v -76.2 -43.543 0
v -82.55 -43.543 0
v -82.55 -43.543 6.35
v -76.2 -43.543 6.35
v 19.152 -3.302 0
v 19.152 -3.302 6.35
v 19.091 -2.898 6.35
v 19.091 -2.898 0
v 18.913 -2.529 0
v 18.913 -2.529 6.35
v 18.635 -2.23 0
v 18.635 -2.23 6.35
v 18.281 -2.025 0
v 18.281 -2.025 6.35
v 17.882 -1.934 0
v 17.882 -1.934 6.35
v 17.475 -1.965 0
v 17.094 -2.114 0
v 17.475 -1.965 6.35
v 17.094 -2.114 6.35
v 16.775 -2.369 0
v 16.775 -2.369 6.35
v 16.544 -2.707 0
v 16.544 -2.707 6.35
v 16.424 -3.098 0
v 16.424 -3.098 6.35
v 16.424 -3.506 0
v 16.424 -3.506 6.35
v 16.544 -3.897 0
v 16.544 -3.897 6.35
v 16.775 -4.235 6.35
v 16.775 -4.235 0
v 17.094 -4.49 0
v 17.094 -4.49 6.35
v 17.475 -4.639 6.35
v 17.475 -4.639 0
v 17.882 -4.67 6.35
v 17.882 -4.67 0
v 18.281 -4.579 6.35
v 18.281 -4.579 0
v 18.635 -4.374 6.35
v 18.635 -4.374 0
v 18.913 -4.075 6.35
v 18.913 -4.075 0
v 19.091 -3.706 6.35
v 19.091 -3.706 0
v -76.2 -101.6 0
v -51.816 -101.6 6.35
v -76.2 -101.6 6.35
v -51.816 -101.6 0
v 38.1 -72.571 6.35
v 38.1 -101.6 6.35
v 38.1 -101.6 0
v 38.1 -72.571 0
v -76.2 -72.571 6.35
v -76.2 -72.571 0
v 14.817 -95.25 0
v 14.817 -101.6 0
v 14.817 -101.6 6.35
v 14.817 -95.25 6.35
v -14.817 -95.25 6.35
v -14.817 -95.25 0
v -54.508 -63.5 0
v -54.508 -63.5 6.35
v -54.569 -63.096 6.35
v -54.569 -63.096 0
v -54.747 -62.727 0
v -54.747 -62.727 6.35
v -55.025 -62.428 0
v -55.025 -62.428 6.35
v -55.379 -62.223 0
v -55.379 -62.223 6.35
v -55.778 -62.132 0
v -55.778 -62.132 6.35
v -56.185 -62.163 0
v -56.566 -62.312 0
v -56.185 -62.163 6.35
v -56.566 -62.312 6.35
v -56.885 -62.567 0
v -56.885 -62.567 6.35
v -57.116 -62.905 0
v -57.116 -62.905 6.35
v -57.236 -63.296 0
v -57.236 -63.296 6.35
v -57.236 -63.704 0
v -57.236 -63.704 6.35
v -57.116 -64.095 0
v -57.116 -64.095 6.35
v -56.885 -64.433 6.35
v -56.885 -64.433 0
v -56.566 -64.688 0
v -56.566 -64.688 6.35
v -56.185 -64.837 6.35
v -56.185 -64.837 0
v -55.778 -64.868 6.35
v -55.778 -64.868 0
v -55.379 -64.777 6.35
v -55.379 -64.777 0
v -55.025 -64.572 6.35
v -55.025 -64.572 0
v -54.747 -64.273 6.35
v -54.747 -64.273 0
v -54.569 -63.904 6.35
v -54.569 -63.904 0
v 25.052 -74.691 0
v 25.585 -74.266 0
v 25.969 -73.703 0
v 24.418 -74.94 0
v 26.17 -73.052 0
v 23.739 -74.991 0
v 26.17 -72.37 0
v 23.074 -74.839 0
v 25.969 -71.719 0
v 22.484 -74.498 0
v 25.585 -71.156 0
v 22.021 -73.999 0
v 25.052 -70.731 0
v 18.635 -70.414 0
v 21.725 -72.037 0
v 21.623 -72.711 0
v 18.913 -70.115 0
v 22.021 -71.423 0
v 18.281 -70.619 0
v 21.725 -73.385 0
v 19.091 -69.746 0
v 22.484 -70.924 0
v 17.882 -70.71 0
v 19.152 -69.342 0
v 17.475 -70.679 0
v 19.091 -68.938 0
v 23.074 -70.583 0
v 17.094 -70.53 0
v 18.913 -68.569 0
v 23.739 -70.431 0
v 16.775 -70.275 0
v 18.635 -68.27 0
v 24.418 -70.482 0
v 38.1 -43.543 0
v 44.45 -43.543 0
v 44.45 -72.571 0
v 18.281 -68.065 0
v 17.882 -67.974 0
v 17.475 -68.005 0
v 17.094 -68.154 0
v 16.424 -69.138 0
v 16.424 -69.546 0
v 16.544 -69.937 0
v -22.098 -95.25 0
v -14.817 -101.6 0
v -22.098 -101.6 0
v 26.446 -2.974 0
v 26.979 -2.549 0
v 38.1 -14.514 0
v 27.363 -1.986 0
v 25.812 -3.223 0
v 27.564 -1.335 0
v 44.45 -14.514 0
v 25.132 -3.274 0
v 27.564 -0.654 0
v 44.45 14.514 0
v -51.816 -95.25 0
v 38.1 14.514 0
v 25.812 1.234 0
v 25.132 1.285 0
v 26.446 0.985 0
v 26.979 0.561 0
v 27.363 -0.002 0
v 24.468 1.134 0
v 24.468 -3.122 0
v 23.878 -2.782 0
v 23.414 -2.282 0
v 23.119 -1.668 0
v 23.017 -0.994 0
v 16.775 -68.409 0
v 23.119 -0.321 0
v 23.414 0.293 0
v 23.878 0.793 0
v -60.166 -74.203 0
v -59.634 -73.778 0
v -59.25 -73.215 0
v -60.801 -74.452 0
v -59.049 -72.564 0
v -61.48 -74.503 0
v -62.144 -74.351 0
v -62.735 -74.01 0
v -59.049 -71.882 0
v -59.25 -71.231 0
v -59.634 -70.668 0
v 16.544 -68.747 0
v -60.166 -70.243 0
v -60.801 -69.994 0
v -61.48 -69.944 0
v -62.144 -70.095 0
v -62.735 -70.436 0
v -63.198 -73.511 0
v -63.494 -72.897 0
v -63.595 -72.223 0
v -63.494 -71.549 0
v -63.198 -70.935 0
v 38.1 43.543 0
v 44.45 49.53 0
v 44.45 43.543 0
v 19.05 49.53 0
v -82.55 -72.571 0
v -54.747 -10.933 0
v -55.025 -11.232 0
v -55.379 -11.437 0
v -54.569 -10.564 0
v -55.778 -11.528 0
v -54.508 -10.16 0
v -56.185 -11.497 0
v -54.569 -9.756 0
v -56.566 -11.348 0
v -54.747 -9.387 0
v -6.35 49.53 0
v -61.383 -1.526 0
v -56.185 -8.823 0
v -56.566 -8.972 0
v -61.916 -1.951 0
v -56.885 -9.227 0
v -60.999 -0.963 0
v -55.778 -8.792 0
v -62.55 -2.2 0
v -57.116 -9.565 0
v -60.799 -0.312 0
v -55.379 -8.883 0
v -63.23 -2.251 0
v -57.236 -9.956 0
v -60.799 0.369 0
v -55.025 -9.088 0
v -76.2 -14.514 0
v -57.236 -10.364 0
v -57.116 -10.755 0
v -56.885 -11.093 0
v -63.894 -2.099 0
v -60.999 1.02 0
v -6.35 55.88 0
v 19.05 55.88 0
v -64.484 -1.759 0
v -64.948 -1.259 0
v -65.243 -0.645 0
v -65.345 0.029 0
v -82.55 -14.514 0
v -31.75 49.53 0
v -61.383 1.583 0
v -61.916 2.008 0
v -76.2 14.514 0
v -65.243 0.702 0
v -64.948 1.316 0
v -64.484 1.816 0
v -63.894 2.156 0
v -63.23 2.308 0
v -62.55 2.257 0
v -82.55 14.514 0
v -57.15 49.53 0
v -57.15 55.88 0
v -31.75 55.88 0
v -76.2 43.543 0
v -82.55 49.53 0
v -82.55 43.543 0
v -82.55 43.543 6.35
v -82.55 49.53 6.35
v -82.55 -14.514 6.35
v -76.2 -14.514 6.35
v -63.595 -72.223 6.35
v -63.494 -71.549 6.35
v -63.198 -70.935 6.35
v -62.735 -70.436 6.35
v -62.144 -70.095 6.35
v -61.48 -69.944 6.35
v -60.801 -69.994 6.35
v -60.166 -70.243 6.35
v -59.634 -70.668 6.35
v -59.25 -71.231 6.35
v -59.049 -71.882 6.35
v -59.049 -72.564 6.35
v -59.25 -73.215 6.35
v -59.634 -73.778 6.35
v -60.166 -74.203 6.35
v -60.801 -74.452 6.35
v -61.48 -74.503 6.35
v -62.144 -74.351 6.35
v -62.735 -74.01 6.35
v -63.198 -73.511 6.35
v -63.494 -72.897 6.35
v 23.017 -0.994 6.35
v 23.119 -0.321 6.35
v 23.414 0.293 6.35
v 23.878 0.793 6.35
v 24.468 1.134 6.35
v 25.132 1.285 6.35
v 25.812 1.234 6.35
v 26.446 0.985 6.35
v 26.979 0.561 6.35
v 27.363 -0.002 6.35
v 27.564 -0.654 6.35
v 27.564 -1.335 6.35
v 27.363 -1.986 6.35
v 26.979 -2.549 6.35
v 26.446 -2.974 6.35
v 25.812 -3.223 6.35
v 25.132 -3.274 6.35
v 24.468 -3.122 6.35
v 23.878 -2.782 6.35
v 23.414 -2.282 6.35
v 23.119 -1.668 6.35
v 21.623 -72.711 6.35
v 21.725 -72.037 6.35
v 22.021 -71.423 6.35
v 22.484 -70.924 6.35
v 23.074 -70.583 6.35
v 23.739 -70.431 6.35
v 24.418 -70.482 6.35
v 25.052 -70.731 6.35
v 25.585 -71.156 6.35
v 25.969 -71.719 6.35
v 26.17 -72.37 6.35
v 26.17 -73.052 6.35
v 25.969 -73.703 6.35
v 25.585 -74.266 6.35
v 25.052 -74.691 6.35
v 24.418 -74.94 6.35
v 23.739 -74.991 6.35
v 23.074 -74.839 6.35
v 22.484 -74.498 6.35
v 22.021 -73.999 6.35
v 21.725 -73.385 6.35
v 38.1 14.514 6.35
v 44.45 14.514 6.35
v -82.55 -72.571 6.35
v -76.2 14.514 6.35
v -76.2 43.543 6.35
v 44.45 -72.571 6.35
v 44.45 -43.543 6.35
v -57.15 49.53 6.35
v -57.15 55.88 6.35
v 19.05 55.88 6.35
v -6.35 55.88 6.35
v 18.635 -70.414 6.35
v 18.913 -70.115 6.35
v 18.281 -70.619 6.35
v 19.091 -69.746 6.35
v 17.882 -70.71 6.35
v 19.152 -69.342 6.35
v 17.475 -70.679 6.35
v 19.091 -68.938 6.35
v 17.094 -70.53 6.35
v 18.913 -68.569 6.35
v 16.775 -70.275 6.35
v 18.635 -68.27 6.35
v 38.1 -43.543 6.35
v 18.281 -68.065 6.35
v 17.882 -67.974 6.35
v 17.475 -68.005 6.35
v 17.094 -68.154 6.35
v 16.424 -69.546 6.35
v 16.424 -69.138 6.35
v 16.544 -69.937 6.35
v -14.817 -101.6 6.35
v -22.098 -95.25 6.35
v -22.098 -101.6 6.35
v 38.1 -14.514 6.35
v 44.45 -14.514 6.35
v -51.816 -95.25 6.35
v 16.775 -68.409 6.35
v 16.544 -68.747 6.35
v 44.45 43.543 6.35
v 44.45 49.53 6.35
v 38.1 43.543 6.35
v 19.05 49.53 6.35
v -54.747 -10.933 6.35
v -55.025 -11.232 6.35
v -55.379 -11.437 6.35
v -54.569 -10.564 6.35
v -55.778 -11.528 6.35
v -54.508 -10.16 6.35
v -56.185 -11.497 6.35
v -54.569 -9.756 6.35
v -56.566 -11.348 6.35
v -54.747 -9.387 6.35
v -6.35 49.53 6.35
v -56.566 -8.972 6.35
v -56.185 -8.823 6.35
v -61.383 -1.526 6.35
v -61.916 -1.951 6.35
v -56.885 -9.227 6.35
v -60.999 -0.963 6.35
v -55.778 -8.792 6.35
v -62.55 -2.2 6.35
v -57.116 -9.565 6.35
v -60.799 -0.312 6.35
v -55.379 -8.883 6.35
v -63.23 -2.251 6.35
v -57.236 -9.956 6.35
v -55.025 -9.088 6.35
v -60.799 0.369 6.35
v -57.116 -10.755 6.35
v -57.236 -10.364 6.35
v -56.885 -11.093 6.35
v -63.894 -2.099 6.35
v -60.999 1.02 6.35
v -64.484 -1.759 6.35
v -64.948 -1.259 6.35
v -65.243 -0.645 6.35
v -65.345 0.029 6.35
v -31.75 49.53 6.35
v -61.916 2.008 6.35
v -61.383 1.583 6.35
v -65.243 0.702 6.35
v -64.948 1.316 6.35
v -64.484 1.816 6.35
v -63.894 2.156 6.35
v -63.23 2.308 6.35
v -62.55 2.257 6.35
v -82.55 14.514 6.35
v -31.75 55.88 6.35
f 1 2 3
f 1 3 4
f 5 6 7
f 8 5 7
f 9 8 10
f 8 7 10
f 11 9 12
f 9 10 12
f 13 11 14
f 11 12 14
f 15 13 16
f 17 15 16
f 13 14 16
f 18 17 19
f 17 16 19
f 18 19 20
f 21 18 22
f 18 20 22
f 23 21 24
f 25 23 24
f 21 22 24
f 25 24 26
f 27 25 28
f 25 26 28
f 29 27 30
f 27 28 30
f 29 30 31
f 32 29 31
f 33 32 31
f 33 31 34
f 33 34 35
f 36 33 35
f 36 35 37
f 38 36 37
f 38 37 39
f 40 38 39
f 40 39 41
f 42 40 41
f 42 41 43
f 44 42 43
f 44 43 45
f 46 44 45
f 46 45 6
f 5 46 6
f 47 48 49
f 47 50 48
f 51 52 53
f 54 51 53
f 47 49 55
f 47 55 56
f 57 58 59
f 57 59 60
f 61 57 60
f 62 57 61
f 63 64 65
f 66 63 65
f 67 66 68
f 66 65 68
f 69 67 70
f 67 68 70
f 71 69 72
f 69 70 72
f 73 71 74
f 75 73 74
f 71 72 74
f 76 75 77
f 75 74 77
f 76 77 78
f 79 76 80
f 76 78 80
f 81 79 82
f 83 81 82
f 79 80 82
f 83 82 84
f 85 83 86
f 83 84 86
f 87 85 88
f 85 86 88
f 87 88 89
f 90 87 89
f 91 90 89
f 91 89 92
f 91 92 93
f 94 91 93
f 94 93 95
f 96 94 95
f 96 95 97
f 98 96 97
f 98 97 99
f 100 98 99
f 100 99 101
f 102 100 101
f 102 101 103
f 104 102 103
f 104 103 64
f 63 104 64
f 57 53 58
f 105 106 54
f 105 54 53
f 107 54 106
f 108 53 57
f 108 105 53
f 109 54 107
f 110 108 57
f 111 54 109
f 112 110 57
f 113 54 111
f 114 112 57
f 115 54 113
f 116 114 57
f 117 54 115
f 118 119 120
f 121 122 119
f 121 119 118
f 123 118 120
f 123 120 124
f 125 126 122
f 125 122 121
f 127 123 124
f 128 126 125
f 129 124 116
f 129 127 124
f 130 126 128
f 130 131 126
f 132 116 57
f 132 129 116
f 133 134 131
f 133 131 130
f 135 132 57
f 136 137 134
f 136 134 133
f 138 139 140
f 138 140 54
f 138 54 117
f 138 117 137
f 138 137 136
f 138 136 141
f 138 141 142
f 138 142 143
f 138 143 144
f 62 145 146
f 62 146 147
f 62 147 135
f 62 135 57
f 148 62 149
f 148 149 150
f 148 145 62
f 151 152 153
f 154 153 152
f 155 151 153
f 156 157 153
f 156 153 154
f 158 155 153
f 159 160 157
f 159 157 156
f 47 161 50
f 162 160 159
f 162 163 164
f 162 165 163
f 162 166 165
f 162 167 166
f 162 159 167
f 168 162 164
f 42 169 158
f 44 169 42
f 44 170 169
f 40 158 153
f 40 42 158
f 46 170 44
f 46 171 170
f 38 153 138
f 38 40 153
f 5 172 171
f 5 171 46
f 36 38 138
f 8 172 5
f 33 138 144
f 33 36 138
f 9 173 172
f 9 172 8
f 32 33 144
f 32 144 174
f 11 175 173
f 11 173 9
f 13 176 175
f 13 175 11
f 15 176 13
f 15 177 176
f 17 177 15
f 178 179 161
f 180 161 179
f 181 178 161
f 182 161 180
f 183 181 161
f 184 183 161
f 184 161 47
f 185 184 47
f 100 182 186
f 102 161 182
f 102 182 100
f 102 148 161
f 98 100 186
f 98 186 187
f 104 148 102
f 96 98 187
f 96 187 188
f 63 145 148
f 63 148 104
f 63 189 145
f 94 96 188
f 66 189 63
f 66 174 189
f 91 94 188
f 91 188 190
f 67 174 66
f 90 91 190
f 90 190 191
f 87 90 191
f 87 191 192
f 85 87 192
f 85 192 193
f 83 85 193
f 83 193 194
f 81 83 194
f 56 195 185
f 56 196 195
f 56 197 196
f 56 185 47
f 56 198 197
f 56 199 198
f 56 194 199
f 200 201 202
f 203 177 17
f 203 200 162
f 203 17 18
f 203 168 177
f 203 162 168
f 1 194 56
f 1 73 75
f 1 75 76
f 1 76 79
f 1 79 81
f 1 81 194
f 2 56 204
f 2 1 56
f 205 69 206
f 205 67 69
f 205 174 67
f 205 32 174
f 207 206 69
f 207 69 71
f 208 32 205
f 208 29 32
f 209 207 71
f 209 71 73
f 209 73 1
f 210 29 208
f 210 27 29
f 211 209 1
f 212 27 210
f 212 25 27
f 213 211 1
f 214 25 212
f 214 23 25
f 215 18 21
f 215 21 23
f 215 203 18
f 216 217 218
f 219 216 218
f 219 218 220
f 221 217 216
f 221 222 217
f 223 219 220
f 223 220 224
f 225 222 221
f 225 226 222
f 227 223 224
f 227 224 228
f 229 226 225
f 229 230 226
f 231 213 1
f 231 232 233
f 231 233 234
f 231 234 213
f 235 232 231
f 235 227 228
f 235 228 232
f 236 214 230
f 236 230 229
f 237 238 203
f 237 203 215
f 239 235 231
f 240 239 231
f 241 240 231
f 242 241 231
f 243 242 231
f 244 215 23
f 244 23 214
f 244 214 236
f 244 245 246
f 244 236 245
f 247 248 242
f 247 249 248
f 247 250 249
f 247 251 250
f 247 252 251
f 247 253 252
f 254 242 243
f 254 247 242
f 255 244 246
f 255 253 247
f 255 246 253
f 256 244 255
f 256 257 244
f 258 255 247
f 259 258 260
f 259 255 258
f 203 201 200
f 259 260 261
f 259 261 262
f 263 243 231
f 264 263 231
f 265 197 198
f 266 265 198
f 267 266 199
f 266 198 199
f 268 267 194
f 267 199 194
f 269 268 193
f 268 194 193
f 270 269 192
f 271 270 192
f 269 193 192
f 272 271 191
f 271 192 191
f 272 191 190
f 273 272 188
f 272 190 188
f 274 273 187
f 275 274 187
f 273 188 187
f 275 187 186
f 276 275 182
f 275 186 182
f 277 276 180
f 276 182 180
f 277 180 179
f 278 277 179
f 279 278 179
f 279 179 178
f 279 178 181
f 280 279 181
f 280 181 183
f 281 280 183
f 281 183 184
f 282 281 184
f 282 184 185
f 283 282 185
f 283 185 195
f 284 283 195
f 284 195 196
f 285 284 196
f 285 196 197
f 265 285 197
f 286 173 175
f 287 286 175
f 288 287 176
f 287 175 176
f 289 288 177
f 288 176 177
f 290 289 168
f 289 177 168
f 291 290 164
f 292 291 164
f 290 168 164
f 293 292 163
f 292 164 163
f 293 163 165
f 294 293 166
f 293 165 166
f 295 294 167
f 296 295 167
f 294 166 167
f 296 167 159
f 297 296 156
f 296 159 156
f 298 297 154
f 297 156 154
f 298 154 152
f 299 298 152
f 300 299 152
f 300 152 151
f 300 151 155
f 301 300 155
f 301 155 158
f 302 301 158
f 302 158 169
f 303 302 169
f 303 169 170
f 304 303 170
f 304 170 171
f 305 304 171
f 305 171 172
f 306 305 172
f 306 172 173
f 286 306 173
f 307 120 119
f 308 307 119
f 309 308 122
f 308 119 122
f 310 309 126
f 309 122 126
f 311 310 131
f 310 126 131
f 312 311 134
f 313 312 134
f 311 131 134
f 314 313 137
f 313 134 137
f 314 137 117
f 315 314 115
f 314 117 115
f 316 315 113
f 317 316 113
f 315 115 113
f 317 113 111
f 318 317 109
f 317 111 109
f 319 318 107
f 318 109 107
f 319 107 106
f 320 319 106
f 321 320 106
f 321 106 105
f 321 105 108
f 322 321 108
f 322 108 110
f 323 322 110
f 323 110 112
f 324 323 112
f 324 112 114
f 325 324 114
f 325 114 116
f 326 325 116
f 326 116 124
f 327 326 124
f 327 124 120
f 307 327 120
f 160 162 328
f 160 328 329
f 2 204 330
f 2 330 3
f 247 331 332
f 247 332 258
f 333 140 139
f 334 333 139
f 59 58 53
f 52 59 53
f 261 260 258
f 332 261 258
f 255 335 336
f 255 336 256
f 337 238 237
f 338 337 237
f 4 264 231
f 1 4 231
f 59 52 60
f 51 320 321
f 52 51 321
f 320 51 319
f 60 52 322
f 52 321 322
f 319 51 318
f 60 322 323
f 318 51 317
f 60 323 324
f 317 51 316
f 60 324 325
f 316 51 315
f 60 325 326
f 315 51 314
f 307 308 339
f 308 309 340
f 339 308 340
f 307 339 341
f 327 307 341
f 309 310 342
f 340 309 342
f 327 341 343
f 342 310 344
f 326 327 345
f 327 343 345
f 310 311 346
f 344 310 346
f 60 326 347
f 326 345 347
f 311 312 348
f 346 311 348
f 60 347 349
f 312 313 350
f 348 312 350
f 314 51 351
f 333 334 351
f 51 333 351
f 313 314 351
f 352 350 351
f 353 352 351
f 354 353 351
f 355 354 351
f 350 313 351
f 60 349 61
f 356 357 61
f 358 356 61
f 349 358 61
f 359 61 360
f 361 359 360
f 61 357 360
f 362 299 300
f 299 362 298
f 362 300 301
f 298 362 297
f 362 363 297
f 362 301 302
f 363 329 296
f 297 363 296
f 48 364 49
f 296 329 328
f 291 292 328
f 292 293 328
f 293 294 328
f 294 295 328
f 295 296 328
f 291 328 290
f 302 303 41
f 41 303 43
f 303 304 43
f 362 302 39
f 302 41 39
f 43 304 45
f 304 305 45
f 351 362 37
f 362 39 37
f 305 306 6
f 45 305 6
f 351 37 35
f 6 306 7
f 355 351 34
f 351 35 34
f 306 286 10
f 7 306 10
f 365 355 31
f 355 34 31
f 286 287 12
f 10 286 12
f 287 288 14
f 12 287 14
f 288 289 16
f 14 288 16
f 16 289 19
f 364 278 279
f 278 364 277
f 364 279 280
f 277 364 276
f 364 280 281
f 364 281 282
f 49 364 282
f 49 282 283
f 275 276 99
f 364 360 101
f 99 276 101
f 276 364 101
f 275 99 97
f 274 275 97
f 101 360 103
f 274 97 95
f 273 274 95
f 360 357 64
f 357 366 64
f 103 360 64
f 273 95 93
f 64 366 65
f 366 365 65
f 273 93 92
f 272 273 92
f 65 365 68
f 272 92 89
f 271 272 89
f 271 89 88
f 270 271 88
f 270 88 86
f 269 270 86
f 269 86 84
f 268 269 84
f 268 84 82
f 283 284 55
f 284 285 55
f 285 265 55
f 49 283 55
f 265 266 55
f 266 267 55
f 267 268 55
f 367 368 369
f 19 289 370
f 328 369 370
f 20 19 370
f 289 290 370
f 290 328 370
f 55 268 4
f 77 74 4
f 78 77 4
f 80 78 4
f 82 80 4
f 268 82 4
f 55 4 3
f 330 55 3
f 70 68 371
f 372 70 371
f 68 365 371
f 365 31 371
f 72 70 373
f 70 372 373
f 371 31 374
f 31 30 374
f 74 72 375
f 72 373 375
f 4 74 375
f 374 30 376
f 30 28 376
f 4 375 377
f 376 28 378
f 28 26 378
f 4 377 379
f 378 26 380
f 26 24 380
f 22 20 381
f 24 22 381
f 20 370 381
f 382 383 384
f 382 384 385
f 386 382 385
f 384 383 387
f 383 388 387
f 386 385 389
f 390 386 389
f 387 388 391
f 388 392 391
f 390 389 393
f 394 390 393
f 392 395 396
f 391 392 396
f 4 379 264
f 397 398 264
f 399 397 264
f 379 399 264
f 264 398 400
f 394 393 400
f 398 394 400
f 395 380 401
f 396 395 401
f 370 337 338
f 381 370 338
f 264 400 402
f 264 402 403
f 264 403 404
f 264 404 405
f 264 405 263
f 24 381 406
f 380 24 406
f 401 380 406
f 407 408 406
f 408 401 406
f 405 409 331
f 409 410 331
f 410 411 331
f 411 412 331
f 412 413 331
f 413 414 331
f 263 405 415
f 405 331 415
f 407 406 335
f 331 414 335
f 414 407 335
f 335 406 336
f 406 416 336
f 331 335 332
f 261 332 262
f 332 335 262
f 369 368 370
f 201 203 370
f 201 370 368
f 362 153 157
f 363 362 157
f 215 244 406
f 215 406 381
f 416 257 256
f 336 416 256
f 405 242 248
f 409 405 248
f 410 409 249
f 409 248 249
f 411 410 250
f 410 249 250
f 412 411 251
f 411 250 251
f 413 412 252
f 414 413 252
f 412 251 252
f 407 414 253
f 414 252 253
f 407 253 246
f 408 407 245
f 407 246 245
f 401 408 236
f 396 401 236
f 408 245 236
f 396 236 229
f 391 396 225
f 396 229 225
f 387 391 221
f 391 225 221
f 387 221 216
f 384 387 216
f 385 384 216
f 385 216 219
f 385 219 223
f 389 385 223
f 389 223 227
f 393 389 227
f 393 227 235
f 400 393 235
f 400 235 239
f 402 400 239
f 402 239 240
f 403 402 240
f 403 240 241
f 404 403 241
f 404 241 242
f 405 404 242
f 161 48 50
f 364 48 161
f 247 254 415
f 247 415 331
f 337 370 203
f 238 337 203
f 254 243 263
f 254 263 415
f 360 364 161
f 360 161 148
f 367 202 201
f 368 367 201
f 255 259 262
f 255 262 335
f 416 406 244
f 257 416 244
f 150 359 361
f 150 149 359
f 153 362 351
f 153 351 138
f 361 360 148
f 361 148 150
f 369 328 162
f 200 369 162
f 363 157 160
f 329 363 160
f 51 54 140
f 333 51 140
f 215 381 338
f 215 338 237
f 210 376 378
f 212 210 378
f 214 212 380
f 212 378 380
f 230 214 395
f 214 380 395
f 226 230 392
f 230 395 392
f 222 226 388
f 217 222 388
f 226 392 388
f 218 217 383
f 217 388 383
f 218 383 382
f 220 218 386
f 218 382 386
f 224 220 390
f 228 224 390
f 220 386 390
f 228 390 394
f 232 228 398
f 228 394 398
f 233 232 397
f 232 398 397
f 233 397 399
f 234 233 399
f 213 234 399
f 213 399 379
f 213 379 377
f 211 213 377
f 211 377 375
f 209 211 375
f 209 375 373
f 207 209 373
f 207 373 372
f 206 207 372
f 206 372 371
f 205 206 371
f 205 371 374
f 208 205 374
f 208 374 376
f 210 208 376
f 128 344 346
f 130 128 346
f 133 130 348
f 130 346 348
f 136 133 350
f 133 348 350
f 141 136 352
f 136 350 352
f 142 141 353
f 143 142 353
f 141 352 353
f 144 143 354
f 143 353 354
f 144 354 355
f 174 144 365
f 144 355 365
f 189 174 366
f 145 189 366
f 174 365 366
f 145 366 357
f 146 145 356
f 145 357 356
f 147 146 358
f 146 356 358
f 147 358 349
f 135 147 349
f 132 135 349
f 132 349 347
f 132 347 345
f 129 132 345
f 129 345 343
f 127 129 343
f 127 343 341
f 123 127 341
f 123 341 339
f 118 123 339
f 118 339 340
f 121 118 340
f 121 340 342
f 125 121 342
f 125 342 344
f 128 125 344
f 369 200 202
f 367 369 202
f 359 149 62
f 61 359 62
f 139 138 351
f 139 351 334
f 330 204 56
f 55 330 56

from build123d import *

# Parameters (mm, degrees)
SKETCH1_W               = 88.9
SKETCH1_H               = 203.2
BOSS_EXTRUDE1_DEPTH     = 6.35
SKETCH3_W               = 29.633333334
SKETCH3_H               = 6.35
CUT_EXTRUDE2_DEPTH      = 112.079633597
CAVITY2_START           = -101.6
CAVITY2_OUTLINE_W       = 6.35
CAVITY2_OUTLINE_H       = 6.35
CAVITY2_DEPTH           = 29.028571429
CAVITY2_START_2         = -43.542857143
CAVITY2_2_OUTLINE_W     = 6.35
CAVITY2_2_OUTLINE_H     = 6.35
CAVITY2_2_DEPTH         = 29.028571429
CAVITY2_START_3         = 14.514285714
CAVITY2_3_OUTLINE_W     = 6.35
CAVITY2_3_OUTLINE_H     = 6.35
CAVITY2_3_DEPTH         = 29.028571429
CUT_EXTRUDE3_DEPTH      = 112.079633597
SKETCH5_W               = 38.1
SKETCH5_H               = 163.83
BOSS_EXTRUDE2_DEPTH     = 6.35
CAVITY3_START           = 49.53
CAVITY3_OUTLINE_W       = 25.4
CAVITY3_OUTLINE_H       = 6.35
CAVITY3_DEPTH           = 6.35
CAVITY3_START_2         = -101.6
CAVITY3_2_OUTLINE_W     = 6.35
CAVITY3_2_OUTLINE_H     = 6.35
CAVITY3_2_DEPTH         = 29.028571429
CAVITY3_START_3         = -43.542857143
CAVITY3_3_OUTLINE_W     = 6.35
CAVITY3_3_OUTLINE_H     = 6.35
CAVITY3_3_DEPTH         = 29.028571429
CAVITY3_START_4         = 14.514285714
CAVITY3_4_OUTLINE_W     = 6.35
CAVITY3_4_OUTLINE_H     = 6.35
CAVITY3_4_DEPTH         = 29.028571429
SKETCH7_W               = 127
SKETCH7_H               = 6.35
CUT_EXTRUDE4_DEPTH      = 132.062523247
CUT_EXTRUDE5_DEPTH      = 132.062523247
CUT_EXTRUDE5_DEPTH_BACK = 132.062523247
SKETCH9_R               = 1.3716
CUT_EXTRUDE6_DEPTH      = 132.062523247
SKETCH10_R              = 2.286
CUT_EXTRUDE8_DEPTH      = 132.062523247


# Read off the part's stored shape, not the designer's step: Cavity2, Cavity3
with BuildPart() as part:
    # Sketch1 → Boss-Extrude1 (new body)
    with BuildSketch(Plane.XY):
        Rectangle(SKETCH1_W, SKETCH1_H)
    extrude(amount=BOSS_EXTRUDE1_DEPTH)

    # Sketch3 → Cut-Extrude2 (cut, through all)
    with BuildSketch(Plane(origin=(0, 0, 0), x_dir=(-1, 0, 0), z_dir=(0, 0, -1))):
        with Locations((0, -98.425)):
            Rectangle(SKETCH3_W, SKETCH3_H)
    extrude(amount=-CUT_EXTRUDE2_DEPTH, mode=Mode.SUBTRACT)

    # Cavity2 outline → Cavity2 (cut)
    with BuildSketch(Plane(origin=(0, 0, 0), x_dir=(1, 0, 0), z_dir=(0, 1, 0)).offset(CAVITY2_START)):
        with Locations((41.275, -3.175)):
            Rectangle(CAVITY2_OUTLINE_W, CAVITY2_OUTLINE_H)
    extrude(amount=CAVITY2_DEPTH, mode=Mode.SUBTRACT)

    # Cavity2 2 outline → Cavity2 2 (cut)
    with BuildSketch(Plane(origin=(0, 0, 0), x_dir=(1, 0, 0), z_dir=(0, 1, 0)).offset(CAVITY2_START_2)):
        with Locations((41.275, -3.175)):
            Rectangle(CAVITY2_2_OUTLINE_W, CAVITY2_2_OUTLINE_H)
    extrude(amount=CAVITY2_2_DEPTH, mode=Mode.SUBTRACT)

    # Cavity2 3 outline → Cavity2 3 (cut)
    with BuildSketch(Plane(origin=(0, 0, 0), x_dir=(1, 0, 0), z_dir=(0, 1, 0)).offset(CAVITY2_START_3)):
        with Locations((41.275, -3.175)):
            Rectangle(CAVITY2_3_OUTLINE_W, CAVITY2_3_OUTLINE_H)
    extrude(amount=CAVITY2_3_DEPTH, mode=Mode.SUBTRACT)

    # Sketch4 → Cut-Extrude3 (cut, through all)
    with BuildSketch(Plane(origin=(0, 0, 0), x_dir=(-1, 0, 0), z_dir=(0, 0, -1))):
        Polygon((0, 62.23), (44.45, 62.23), (44.45, 101.6), (-44.45, 101.6), (-44.45, 62.23), align=None)
    extrude(amount=-CUT_EXTRUDE3_DEPTH, mode=Mode.SUBTRACT)

    # Sketch5 → Boss-Extrude2 (add, through all)
    with BuildSketch(Plane(origin=(0, 0, 0), x_dir=(-1, 0, 0), z_dir=(0, 0, -1))):
        with Locations((63.5, -19.685)):
            Rectangle(SKETCH5_W, SKETCH5_H)
    extrude(amount=-BOSS_EXTRUDE2_DEPTH)

    # Cavity3 outline → Cavity3 (cut)
    with BuildSketch(Plane(origin=(0, 0, 0), x_dir=(1, 0, 0), z_dir=(0, 1, 0)).offset(CAVITY3_START)):
        with Locations((-69.85, -3.175)):
            Rectangle(CAVITY3_OUTLINE_W, CAVITY3_OUTLINE_H)
        with Locations((-19.05, -3.175)):
            Rectangle(CAVITY3_OUTLINE_W, CAVITY3_OUTLINE_H)
        with Locations((31.75, -3.175)):
            Rectangle(CAVITY3_OUTLINE_W, CAVITY3_OUTLINE_H)
    extrude(amount=CAVITY3_DEPTH, mode=Mode.SUBTRACT)

    # Cavity3 2 outline → Cavity3 2 (cut)
    with BuildSketch(Plane(origin=(0, 0, 0), x_dir=(1, 0, 0), z_dir=(0, 1, 0)).offset(CAVITY3_START_2)):
        with Locations((-79.375, -3.175)):
            Rectangle(CAVITY3_2_OUTLINE_W, CAVITY3_2_OUTLINE_H)
    extrude(amount=CAVITY3_2_DEPTH, mode=Mode.SUBTRACT)

    # Cavity3 3 outline → Cavity3 3 (cut)
    with BuildSketch(Plane(origin=(0, 0, 0), x_dir=(1, 0, 0), z_dir=(0, 1, 0)).offset(CAVITY3_START_3)):
        with Locations((-79.375, -3.175)):
            Rectangle(CAVITY3_3_OUTLINE_W, CAVITY3_3_OUTLINE_H)
    extrude(amount=CAVITY3_3_DEPTH, mode=Mode.SUBTRACT)

    # Cavity3 4 outline → Cavity3 4 (cut)
    with BuildSketch(Plane(origin=(0, 0, 0), x_dir=(1, 0, 0), z_dir=(0, 1, 0)).offset(CAVITY3_START_4)):
        with Locations((-79.375, -3.175)):
            Rectangle(CAVITY3_4_OUTLINE_W, CAVITY3_4_OUTLINE_H)
    extrude(amount=CAVITY3_4_DEPTH, mode=Mode.SUBTRACT)

    # Sketch7 → Cut-Extrude4 (cut, through all)
    with BuildSketch(Plane(origin=(0, 0, 0), x_dir=(-1, 0, 0), z_dir=(0, 0, -1))):
        with Locations((19.05, 59.055)):
            Rectangle(SKETCH7_W, SKETCH7_H)
    extrude(amount=-CUT_EXTRUDE4_DEPTH, mode=Mode.SUBTRACT)

    # Sketch8 → Cut-Extrude5 (cut, two sides: drawn at the far end of the back side and taken through both)
    with BuildSketch(Plane(origin=(0, 0, 0), x_dir=(-1, 0, 0), z_dir=(0, 0, -1)).offset(-CUT_EXTRUDE5_DEPTH_BACK)):
        Polygon((51.816, -480.745462689), (51.816, -101.6), (51.816, -95.25), (22.098, -95.25), (22.098, -101.6), (22.098, -480.745462689), (22.098, -1239.036388068), (51.816, -1239.036388068), align=None)
    extrude(amount=CUT_EXTRUDE5_DEPTH + CUT_EXTRUDE5_DEPTH_BACK, mode=Mode.SUBTRACT)

    # Sketch9 → Cut-Extrude6 (cut, through all)
    with BuildSketch(Plane.XY.offset(6.35)):
        with Locations((-55.88, -63.5)):
            Circle(SKETCH9_R)
        with Locations((17.78, -69.342)):
            Circle(SKETCH9_R)
        with Locations((-55.88, -10.16)):
            Circle(SKETCH9_R)
        with Locations((17.78, -3.302)):
            Circle(SKETCH9_R)
    extrude(amount=-CUT_EXTRUDE6_DEPTH, mode=Mode.SUBTRACT)

    # Sketch10 → Cut-Extrude8 (cut, through all)
    with BuildSketch(Plane(origin=(0, 0, 0), x_dir=(-1, 0, 0), z_dir=(0, 0, -1))):
        with Locations((61.309312367, -72.22311472)):
            Circle(SKETCH10_R)
        with Locations((63.059030347, 0.028511897)):
            Circle(SKETCH10_R)
        with Locations((-23.90939041, -72.710988475)):
            Circle(SKETCH10_R)
        with Locations((-25.303227794, -0.994316453)):
            Circle(SKETCH10_R)
    extrude(amount=-CUT_EXTRUDE8_DEPTH, mode=Mode.SUBTRACT)


solid = part.part
